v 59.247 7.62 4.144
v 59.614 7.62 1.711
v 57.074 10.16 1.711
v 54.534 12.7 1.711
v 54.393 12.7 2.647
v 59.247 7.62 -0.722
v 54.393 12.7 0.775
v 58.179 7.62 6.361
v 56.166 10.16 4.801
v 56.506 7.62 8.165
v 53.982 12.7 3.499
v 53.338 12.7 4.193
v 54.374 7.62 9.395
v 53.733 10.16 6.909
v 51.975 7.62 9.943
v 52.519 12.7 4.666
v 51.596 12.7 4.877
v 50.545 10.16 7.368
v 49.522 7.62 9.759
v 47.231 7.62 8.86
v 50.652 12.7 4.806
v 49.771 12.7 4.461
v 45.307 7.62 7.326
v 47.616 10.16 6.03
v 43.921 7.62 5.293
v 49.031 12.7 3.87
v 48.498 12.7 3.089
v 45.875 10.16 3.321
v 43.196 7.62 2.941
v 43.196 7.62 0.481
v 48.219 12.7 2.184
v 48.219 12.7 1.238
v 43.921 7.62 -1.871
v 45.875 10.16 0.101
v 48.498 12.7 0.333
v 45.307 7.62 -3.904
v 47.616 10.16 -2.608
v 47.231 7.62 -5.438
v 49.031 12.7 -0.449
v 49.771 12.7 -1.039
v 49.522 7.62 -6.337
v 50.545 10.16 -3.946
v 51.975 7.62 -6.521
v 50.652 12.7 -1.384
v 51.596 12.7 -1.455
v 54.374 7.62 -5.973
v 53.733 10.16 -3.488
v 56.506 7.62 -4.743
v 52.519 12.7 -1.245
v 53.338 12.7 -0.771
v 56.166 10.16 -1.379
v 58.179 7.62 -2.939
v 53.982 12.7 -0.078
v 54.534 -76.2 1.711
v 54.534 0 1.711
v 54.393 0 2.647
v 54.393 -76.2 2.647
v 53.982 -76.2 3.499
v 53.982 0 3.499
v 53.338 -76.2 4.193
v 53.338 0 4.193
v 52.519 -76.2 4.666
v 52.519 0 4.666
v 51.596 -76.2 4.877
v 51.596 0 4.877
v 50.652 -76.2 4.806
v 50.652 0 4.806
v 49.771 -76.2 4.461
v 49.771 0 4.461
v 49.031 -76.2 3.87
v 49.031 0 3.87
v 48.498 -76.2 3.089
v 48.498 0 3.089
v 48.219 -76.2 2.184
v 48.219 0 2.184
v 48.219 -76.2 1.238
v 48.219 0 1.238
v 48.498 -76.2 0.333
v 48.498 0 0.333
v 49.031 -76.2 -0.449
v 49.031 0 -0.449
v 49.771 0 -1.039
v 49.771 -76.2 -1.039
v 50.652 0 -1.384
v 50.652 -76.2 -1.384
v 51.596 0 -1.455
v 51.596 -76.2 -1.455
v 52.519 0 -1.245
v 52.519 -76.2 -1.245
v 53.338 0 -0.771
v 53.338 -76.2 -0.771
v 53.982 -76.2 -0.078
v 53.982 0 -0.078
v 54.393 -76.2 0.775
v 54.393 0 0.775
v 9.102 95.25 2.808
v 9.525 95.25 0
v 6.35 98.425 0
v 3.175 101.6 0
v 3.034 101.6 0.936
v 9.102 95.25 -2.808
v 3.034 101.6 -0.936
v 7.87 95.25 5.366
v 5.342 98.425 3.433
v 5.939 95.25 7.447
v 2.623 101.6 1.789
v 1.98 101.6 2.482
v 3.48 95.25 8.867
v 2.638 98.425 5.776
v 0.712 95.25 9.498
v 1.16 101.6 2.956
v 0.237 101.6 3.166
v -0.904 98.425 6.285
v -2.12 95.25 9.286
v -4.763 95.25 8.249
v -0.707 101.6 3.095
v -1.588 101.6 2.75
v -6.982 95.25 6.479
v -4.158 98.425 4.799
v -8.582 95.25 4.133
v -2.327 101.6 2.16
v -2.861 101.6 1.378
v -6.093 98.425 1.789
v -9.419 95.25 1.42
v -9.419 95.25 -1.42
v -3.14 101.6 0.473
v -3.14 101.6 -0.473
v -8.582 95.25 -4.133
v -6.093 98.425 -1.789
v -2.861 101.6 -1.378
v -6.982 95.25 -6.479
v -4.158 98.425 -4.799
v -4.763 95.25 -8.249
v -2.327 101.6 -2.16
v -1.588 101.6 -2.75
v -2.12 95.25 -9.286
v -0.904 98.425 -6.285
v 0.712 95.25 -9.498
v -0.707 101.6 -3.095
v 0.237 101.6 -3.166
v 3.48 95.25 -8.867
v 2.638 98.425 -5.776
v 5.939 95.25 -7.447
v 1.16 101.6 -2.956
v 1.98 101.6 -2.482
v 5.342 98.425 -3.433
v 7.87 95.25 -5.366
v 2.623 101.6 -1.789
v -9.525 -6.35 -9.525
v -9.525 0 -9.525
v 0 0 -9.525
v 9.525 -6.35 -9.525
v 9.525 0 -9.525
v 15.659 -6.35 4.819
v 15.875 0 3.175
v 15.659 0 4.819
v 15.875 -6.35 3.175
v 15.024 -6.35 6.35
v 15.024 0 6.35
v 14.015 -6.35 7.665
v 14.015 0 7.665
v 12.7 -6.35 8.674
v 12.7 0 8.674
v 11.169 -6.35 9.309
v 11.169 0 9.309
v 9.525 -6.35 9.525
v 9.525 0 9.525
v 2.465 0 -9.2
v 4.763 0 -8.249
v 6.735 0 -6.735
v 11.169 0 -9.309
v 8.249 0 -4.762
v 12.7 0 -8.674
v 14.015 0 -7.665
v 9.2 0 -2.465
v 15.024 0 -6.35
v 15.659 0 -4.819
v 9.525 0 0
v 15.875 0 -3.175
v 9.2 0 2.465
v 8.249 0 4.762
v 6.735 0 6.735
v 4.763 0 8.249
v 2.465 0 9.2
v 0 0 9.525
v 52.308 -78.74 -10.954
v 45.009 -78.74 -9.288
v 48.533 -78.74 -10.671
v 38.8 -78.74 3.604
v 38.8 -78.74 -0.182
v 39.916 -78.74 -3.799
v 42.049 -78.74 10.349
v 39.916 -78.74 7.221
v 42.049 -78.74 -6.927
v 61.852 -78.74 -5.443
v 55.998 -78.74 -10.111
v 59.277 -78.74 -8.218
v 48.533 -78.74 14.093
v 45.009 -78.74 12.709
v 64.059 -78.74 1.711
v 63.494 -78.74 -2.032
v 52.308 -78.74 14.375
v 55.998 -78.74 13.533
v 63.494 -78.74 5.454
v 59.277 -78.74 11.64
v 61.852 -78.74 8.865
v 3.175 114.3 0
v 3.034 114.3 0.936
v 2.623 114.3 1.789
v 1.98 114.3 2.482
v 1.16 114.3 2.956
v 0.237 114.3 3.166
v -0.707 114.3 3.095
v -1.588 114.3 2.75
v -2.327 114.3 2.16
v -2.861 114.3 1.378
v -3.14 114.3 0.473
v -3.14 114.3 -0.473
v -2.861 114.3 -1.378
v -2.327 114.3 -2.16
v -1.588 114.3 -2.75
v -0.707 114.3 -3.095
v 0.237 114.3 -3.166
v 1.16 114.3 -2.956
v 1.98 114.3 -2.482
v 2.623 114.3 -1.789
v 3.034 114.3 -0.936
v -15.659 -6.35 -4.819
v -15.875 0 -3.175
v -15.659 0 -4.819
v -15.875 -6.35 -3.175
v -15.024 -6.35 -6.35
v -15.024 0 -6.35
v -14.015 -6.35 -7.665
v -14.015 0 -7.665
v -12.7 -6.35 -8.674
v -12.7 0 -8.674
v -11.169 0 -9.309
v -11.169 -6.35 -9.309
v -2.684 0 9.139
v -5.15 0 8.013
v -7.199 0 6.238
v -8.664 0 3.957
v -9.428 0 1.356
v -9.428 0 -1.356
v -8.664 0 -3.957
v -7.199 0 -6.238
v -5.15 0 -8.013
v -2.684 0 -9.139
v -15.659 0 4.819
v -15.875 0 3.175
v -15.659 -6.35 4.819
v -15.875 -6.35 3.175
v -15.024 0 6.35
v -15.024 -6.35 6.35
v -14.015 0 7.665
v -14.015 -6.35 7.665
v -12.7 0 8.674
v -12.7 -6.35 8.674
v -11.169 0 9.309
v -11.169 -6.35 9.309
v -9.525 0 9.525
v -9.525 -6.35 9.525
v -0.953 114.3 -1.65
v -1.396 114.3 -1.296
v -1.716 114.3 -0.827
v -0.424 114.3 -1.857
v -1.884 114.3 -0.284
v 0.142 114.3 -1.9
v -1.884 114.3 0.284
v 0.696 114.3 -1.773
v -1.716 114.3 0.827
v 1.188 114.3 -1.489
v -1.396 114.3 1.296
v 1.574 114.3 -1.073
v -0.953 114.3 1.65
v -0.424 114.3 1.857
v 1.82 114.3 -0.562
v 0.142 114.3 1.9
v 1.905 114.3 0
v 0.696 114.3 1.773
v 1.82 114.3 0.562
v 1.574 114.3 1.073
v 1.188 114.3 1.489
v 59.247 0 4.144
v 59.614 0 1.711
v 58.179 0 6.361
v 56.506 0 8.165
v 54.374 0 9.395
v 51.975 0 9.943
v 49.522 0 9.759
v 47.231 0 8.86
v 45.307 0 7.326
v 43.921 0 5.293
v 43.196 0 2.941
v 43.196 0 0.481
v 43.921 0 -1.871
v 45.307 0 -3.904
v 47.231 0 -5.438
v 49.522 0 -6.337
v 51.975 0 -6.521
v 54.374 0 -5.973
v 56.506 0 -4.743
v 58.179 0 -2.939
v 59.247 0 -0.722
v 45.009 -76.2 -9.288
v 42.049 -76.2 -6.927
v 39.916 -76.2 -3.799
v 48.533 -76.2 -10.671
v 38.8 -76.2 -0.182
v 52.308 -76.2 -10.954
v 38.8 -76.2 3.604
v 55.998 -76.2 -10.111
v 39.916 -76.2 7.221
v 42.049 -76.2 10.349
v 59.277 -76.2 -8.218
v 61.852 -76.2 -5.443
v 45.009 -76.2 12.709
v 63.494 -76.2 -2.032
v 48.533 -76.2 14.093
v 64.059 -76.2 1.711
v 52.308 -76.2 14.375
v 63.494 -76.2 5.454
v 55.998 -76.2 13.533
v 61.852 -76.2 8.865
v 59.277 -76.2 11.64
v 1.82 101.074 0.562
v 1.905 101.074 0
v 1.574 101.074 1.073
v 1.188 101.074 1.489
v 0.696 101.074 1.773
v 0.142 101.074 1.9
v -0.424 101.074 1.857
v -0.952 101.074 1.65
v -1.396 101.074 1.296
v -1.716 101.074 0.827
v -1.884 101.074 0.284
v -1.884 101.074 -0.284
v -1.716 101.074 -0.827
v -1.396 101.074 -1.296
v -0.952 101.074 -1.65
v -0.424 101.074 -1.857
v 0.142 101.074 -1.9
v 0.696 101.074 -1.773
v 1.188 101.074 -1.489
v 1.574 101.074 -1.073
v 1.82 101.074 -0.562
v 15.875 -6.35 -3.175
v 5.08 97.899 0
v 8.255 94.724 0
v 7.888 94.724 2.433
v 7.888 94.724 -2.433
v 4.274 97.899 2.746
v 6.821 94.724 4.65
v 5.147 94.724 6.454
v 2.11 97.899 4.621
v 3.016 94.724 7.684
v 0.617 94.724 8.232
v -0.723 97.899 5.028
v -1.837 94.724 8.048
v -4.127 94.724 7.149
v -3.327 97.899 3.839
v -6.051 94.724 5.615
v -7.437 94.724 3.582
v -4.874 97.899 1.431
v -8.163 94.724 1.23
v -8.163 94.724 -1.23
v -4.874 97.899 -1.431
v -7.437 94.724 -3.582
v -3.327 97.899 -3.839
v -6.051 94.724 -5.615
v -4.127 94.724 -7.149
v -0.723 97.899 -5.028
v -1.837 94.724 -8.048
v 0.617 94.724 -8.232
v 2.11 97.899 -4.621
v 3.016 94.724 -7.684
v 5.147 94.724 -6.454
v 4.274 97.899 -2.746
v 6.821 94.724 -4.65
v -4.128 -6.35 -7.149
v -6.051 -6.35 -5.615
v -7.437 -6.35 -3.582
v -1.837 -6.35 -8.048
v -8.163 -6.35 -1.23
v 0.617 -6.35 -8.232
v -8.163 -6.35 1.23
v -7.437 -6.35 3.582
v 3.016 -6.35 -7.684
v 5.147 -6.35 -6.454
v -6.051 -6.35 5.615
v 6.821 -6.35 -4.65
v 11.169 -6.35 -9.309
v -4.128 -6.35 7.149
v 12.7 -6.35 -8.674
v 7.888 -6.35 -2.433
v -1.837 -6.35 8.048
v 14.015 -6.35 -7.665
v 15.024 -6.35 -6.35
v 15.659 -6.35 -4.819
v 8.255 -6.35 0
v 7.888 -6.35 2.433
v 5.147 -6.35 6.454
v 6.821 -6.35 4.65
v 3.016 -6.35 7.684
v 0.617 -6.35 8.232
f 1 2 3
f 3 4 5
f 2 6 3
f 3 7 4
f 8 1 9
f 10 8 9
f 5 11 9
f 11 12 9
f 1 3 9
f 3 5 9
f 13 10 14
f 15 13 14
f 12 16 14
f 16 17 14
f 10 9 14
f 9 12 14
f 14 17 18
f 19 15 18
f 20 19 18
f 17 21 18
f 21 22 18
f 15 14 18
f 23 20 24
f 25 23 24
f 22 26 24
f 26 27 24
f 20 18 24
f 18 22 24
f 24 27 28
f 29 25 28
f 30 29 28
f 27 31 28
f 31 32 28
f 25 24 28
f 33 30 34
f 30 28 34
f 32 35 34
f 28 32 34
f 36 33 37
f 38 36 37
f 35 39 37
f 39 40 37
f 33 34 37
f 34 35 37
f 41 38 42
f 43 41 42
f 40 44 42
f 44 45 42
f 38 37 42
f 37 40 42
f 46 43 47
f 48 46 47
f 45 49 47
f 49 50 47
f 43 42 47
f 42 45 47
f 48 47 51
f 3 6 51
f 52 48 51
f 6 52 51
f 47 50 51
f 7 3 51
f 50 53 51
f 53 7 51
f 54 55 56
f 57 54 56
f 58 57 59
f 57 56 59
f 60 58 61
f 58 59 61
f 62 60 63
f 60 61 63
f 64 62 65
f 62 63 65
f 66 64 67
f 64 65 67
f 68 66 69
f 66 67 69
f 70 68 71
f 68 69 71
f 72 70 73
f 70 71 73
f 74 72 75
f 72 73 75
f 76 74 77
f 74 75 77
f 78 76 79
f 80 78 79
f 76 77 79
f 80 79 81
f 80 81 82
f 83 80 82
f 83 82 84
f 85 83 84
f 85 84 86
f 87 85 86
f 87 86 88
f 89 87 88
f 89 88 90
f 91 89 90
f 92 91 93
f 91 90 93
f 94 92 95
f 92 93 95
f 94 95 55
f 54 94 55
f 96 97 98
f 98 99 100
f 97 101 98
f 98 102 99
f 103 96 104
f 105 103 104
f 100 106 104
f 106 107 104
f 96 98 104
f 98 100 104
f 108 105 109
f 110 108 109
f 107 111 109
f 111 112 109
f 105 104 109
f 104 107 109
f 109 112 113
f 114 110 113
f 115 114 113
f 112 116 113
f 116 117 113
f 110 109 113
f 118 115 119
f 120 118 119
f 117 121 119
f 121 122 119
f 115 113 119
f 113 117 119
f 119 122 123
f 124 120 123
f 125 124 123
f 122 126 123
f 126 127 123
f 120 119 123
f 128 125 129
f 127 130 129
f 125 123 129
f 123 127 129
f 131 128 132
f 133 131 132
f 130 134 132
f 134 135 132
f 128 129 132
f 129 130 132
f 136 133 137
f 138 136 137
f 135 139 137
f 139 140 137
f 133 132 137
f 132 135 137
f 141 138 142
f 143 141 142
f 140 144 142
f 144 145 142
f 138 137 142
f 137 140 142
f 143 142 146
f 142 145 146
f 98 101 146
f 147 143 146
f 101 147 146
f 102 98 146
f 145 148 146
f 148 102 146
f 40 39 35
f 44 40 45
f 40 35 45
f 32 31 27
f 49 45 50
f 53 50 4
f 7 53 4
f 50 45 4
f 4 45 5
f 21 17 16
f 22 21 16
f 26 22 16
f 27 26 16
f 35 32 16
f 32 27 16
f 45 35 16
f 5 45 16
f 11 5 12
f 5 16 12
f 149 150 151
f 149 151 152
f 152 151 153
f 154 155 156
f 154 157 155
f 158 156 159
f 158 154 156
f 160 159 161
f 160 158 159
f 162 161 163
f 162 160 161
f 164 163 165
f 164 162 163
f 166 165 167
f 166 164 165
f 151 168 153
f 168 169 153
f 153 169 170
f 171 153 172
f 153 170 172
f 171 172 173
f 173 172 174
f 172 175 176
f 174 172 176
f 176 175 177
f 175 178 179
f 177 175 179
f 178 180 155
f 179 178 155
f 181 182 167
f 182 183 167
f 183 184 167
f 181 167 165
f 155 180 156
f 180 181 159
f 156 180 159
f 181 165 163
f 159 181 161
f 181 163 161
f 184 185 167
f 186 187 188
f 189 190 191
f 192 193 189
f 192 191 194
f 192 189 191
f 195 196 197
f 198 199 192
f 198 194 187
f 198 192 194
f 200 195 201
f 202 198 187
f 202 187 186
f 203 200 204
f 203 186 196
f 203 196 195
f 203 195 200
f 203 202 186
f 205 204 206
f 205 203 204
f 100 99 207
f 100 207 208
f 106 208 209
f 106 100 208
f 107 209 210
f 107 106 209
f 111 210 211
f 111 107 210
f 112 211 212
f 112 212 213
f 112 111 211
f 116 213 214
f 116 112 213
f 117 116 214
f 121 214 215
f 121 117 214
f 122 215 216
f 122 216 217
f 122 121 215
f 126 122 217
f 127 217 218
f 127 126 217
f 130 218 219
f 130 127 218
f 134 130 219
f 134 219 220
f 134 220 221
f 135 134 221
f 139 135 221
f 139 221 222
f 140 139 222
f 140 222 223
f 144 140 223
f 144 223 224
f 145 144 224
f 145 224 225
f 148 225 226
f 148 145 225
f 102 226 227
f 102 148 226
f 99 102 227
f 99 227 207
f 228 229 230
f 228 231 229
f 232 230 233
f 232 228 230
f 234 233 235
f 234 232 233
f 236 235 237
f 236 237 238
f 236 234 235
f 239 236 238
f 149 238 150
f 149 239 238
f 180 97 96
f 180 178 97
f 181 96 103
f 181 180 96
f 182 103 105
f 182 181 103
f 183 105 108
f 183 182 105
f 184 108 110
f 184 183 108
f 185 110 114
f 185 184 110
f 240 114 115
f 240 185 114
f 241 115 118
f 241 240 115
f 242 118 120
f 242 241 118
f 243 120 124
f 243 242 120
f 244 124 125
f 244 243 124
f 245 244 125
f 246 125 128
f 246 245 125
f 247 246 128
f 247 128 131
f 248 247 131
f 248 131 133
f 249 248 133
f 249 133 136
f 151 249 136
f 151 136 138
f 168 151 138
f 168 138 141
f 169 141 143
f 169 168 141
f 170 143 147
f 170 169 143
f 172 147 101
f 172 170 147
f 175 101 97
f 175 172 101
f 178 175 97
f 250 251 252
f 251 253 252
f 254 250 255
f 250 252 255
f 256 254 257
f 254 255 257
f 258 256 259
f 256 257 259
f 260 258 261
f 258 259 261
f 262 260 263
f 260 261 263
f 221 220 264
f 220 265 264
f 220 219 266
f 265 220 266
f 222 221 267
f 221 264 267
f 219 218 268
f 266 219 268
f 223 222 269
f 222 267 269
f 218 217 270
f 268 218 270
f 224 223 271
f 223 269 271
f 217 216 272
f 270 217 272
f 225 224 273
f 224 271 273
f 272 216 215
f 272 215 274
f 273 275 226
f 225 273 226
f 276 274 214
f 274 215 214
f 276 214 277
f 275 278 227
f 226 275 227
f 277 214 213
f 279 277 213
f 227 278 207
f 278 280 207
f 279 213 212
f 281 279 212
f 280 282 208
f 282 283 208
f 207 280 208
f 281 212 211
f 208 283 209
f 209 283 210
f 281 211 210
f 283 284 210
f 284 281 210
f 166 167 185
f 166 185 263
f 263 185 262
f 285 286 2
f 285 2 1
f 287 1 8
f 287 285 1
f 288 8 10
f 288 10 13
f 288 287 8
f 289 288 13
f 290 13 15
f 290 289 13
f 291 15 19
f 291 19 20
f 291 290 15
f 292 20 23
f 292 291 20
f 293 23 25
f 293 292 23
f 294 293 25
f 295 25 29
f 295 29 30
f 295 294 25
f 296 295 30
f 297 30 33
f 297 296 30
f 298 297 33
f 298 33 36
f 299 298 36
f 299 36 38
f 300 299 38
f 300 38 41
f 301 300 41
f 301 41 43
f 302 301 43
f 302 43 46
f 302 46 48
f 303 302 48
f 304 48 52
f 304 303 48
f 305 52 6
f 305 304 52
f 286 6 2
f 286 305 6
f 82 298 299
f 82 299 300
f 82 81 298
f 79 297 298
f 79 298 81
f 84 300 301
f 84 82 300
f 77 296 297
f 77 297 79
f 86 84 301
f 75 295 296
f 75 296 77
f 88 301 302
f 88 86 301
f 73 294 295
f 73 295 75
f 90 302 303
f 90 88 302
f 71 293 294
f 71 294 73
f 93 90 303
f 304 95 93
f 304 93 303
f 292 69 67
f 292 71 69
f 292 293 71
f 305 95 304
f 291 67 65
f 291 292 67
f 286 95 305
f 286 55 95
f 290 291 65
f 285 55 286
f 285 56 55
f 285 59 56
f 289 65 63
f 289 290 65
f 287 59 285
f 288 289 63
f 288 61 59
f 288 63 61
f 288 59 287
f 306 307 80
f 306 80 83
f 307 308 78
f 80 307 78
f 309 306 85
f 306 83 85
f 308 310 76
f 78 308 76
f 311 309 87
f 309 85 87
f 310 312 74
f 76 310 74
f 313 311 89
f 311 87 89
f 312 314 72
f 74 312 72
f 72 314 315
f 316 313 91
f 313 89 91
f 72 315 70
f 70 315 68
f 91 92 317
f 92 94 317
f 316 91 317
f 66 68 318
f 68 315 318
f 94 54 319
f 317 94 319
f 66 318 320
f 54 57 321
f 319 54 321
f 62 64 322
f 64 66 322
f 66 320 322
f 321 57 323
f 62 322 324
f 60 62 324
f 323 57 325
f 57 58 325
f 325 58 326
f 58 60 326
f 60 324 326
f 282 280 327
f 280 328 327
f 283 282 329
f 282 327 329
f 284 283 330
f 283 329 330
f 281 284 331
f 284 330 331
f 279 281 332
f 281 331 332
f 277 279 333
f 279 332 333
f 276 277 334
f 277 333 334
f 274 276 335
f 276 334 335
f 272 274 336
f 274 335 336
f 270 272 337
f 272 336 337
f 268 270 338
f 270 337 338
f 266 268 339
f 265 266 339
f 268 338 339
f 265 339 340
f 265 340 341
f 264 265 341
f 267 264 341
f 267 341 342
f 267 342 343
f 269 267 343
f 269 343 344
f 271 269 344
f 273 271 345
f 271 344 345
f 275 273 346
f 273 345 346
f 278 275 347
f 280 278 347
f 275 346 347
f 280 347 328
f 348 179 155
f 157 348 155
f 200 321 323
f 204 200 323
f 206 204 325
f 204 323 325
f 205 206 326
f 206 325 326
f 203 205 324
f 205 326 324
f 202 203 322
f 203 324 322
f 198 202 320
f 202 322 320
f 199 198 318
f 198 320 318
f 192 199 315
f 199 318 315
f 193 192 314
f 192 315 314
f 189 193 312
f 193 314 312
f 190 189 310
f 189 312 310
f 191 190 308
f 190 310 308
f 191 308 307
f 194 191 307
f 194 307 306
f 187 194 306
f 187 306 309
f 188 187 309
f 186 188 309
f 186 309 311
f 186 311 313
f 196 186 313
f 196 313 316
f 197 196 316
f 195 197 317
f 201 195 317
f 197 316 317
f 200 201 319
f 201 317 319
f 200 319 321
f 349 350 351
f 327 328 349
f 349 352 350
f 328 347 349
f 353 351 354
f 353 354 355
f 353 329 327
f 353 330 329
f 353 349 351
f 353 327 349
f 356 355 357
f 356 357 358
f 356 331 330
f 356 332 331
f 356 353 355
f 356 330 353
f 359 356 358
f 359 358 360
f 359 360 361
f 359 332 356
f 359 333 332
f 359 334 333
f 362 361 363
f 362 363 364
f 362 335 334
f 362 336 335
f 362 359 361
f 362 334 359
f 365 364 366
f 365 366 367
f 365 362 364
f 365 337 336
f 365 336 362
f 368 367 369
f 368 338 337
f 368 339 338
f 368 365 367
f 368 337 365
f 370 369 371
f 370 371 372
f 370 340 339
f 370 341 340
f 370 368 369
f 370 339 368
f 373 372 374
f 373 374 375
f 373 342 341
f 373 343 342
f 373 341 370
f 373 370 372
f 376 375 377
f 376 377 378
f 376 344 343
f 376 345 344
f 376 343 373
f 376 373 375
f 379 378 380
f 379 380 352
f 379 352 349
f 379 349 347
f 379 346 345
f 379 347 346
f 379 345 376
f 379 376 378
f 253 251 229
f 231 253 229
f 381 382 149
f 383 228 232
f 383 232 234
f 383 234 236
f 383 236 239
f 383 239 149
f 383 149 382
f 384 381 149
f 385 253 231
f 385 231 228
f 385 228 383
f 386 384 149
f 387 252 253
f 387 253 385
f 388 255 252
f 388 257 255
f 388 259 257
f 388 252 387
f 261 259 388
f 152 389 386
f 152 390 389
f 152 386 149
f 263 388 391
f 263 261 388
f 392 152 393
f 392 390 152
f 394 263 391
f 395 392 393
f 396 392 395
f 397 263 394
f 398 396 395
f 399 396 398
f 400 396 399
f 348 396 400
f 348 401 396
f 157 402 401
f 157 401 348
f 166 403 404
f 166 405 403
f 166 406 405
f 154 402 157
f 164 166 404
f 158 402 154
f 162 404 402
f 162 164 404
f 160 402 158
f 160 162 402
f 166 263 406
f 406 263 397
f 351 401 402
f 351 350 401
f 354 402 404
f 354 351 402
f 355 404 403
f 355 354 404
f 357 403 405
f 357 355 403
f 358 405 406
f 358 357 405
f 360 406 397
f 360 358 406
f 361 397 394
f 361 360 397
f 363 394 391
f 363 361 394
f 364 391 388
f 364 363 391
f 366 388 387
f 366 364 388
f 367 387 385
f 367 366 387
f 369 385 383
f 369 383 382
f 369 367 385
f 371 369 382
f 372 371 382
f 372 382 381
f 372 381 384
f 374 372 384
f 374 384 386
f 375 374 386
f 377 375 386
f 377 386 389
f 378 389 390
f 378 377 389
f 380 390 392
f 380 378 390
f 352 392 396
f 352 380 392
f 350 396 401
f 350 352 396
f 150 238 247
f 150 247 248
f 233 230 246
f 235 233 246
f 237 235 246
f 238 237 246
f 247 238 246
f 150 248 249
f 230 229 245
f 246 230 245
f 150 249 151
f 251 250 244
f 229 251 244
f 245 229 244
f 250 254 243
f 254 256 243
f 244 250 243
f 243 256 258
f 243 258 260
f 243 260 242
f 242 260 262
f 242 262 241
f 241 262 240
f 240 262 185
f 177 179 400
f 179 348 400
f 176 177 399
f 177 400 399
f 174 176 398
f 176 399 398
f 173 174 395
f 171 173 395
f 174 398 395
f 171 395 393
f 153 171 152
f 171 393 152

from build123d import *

# Parameters (mm, degrees)
F0_R      = 9.525
F1_DEPTH  = 101.6
F2_SIZE   = 6.35
F3_DEPTH  = 12.7
F4_T      = -1.27
F5_DEPTH  = 25.4
F6_R      = 8.255
F7_DEPTH  = 6.35
F8_R      = 6.35
F9_R      = 8.255
F10_DEPTH = 12.7
F11_R     = 3.175
F12_DEPTH = 76.2
F13_R     = 12.7
F14_DEPTH = 2.54
F15_SIZE  = 5.08


with BuildPart() as f1:
    # F0 (on Front) → F1 (new body)
    with BuildSketch(Plane.XZ):
        Circle(F0_R)
    extrude(amount=-F1_DEPTH)

    # F2
    f2_edges = [f1.edges().sort_by_distance(p)[0] for p in [
        (-9.525, 101.6, 0),
    ]]
    chamfer(f2_edges, length=F2_SIZE)

    # F3 (add): a face of the model
    f3_faces = [f1.faces().sort_by_distance(p)[0] for p in [
        (0, 101.6, 0),
    ]]
    extrude(f3_faces, amount=F3_DEPTH)

    # F4
    f4_openings = [f1.faces().sort_by_distance(p)[0] for p in [
        (0, 0, 0),
    ]]
    offset(amount=F4_T, openings=f4_openings, kind=Kind.INTERSECTION)

    # F5 (cut): a face of the model
    f5_faces = [f1.faces().sort_by_distance(p)[0] for p in [
        (0, 113.03, 0),
    ]]
    extrude(f5_faces, amount=-F5_DEPTH, mode=Mode.SUBTRACT)

    # F6 (on face) → F7 (join)
    with BuildSketch(Plane.XZ):
        with BuildLine():
            Line((0, 9.525), (-15.875, 9.525))
            Line((-15.875, 9.525), (-15.875, -9.525))
            Line((-15.875, -9.525), (0, -9.525))
            ThreePointArc((0, -9.525), (-9.525, 0), (0, 9.525))
        make_face()
        with BuildLine():
            Line((15.875, 9.525), (0, 9.525))
            ThreePointArc((0, 9.525), (6.7351920908, 6.7351920908), (9.525, 0))
            ThreePointArc((9.525, 0), (6.7351920908, -6.7351920908), (0, -9.525))
            Line((0, -9.525), (15.875, -9.525))
            Line((15.875, -9.525), (15.875, 9.525))
        make_face()
        with BuildLine():
            ThreePointArc((9.525, 0), (6.7351920908, 6.7351920908), (0, 9.525))
            ThreePointArc((0, 9.525), (-9.525, 0), (0, -9.525))
            ThreePointArc((0, -9.525), (6.7351920908, -6.7351920908), (9.525, 0))
        make_face()
        Circle(F6_R, mode=Mode.SUBTRACT)
    extrude(amount=F7_DEPTH)

    # F8
    f8_edges = [f1.edges().sort_by_distance(p)[0] for p in [
        (-15.875, -3.175, 9.525),
        (15.875, -3.175, 9.525),
        (-15.875, -3.175, -9.525),
        (15.875, -3.175, -9.525),
    ]]
    fillet(f8_edges, radius=F8_R)


with BuildPart() as f10:
    # F9 (on Front) → F10 (new body)
    with BuildSketch(Plane.XZ):
        with Locations((51.358602941, 1.7109198961)):
            Circle(F9_R)
    extrude(amount=-F10_DEPTH)

    # F11 (on face) → F12 (join)
    with BuildSketch(Plane.XZ):
        with Locations((51.358602941, 1.7109198961)):
            Circle(F11_R)
    extrude(amount=F12_DEPTH)

    # F13 (on face) → F14 (join)
    with BuildSketch(Plane.XZ.offset(76.2)):
        with Locations((51.358602941, 1.7109198961)):
            Circle(F13_R)
    extrude(amount=F14_DEPTH)

    # F15
    f15_edges = [f10.edges().sort_by_distance(p)[0] for p in [
        (43.103603, 12.7, 1.71092),
    ]]
    chamfer(f15_edges, length=F15_SIZE)


solid = Compound([f1.part, f10.part])
